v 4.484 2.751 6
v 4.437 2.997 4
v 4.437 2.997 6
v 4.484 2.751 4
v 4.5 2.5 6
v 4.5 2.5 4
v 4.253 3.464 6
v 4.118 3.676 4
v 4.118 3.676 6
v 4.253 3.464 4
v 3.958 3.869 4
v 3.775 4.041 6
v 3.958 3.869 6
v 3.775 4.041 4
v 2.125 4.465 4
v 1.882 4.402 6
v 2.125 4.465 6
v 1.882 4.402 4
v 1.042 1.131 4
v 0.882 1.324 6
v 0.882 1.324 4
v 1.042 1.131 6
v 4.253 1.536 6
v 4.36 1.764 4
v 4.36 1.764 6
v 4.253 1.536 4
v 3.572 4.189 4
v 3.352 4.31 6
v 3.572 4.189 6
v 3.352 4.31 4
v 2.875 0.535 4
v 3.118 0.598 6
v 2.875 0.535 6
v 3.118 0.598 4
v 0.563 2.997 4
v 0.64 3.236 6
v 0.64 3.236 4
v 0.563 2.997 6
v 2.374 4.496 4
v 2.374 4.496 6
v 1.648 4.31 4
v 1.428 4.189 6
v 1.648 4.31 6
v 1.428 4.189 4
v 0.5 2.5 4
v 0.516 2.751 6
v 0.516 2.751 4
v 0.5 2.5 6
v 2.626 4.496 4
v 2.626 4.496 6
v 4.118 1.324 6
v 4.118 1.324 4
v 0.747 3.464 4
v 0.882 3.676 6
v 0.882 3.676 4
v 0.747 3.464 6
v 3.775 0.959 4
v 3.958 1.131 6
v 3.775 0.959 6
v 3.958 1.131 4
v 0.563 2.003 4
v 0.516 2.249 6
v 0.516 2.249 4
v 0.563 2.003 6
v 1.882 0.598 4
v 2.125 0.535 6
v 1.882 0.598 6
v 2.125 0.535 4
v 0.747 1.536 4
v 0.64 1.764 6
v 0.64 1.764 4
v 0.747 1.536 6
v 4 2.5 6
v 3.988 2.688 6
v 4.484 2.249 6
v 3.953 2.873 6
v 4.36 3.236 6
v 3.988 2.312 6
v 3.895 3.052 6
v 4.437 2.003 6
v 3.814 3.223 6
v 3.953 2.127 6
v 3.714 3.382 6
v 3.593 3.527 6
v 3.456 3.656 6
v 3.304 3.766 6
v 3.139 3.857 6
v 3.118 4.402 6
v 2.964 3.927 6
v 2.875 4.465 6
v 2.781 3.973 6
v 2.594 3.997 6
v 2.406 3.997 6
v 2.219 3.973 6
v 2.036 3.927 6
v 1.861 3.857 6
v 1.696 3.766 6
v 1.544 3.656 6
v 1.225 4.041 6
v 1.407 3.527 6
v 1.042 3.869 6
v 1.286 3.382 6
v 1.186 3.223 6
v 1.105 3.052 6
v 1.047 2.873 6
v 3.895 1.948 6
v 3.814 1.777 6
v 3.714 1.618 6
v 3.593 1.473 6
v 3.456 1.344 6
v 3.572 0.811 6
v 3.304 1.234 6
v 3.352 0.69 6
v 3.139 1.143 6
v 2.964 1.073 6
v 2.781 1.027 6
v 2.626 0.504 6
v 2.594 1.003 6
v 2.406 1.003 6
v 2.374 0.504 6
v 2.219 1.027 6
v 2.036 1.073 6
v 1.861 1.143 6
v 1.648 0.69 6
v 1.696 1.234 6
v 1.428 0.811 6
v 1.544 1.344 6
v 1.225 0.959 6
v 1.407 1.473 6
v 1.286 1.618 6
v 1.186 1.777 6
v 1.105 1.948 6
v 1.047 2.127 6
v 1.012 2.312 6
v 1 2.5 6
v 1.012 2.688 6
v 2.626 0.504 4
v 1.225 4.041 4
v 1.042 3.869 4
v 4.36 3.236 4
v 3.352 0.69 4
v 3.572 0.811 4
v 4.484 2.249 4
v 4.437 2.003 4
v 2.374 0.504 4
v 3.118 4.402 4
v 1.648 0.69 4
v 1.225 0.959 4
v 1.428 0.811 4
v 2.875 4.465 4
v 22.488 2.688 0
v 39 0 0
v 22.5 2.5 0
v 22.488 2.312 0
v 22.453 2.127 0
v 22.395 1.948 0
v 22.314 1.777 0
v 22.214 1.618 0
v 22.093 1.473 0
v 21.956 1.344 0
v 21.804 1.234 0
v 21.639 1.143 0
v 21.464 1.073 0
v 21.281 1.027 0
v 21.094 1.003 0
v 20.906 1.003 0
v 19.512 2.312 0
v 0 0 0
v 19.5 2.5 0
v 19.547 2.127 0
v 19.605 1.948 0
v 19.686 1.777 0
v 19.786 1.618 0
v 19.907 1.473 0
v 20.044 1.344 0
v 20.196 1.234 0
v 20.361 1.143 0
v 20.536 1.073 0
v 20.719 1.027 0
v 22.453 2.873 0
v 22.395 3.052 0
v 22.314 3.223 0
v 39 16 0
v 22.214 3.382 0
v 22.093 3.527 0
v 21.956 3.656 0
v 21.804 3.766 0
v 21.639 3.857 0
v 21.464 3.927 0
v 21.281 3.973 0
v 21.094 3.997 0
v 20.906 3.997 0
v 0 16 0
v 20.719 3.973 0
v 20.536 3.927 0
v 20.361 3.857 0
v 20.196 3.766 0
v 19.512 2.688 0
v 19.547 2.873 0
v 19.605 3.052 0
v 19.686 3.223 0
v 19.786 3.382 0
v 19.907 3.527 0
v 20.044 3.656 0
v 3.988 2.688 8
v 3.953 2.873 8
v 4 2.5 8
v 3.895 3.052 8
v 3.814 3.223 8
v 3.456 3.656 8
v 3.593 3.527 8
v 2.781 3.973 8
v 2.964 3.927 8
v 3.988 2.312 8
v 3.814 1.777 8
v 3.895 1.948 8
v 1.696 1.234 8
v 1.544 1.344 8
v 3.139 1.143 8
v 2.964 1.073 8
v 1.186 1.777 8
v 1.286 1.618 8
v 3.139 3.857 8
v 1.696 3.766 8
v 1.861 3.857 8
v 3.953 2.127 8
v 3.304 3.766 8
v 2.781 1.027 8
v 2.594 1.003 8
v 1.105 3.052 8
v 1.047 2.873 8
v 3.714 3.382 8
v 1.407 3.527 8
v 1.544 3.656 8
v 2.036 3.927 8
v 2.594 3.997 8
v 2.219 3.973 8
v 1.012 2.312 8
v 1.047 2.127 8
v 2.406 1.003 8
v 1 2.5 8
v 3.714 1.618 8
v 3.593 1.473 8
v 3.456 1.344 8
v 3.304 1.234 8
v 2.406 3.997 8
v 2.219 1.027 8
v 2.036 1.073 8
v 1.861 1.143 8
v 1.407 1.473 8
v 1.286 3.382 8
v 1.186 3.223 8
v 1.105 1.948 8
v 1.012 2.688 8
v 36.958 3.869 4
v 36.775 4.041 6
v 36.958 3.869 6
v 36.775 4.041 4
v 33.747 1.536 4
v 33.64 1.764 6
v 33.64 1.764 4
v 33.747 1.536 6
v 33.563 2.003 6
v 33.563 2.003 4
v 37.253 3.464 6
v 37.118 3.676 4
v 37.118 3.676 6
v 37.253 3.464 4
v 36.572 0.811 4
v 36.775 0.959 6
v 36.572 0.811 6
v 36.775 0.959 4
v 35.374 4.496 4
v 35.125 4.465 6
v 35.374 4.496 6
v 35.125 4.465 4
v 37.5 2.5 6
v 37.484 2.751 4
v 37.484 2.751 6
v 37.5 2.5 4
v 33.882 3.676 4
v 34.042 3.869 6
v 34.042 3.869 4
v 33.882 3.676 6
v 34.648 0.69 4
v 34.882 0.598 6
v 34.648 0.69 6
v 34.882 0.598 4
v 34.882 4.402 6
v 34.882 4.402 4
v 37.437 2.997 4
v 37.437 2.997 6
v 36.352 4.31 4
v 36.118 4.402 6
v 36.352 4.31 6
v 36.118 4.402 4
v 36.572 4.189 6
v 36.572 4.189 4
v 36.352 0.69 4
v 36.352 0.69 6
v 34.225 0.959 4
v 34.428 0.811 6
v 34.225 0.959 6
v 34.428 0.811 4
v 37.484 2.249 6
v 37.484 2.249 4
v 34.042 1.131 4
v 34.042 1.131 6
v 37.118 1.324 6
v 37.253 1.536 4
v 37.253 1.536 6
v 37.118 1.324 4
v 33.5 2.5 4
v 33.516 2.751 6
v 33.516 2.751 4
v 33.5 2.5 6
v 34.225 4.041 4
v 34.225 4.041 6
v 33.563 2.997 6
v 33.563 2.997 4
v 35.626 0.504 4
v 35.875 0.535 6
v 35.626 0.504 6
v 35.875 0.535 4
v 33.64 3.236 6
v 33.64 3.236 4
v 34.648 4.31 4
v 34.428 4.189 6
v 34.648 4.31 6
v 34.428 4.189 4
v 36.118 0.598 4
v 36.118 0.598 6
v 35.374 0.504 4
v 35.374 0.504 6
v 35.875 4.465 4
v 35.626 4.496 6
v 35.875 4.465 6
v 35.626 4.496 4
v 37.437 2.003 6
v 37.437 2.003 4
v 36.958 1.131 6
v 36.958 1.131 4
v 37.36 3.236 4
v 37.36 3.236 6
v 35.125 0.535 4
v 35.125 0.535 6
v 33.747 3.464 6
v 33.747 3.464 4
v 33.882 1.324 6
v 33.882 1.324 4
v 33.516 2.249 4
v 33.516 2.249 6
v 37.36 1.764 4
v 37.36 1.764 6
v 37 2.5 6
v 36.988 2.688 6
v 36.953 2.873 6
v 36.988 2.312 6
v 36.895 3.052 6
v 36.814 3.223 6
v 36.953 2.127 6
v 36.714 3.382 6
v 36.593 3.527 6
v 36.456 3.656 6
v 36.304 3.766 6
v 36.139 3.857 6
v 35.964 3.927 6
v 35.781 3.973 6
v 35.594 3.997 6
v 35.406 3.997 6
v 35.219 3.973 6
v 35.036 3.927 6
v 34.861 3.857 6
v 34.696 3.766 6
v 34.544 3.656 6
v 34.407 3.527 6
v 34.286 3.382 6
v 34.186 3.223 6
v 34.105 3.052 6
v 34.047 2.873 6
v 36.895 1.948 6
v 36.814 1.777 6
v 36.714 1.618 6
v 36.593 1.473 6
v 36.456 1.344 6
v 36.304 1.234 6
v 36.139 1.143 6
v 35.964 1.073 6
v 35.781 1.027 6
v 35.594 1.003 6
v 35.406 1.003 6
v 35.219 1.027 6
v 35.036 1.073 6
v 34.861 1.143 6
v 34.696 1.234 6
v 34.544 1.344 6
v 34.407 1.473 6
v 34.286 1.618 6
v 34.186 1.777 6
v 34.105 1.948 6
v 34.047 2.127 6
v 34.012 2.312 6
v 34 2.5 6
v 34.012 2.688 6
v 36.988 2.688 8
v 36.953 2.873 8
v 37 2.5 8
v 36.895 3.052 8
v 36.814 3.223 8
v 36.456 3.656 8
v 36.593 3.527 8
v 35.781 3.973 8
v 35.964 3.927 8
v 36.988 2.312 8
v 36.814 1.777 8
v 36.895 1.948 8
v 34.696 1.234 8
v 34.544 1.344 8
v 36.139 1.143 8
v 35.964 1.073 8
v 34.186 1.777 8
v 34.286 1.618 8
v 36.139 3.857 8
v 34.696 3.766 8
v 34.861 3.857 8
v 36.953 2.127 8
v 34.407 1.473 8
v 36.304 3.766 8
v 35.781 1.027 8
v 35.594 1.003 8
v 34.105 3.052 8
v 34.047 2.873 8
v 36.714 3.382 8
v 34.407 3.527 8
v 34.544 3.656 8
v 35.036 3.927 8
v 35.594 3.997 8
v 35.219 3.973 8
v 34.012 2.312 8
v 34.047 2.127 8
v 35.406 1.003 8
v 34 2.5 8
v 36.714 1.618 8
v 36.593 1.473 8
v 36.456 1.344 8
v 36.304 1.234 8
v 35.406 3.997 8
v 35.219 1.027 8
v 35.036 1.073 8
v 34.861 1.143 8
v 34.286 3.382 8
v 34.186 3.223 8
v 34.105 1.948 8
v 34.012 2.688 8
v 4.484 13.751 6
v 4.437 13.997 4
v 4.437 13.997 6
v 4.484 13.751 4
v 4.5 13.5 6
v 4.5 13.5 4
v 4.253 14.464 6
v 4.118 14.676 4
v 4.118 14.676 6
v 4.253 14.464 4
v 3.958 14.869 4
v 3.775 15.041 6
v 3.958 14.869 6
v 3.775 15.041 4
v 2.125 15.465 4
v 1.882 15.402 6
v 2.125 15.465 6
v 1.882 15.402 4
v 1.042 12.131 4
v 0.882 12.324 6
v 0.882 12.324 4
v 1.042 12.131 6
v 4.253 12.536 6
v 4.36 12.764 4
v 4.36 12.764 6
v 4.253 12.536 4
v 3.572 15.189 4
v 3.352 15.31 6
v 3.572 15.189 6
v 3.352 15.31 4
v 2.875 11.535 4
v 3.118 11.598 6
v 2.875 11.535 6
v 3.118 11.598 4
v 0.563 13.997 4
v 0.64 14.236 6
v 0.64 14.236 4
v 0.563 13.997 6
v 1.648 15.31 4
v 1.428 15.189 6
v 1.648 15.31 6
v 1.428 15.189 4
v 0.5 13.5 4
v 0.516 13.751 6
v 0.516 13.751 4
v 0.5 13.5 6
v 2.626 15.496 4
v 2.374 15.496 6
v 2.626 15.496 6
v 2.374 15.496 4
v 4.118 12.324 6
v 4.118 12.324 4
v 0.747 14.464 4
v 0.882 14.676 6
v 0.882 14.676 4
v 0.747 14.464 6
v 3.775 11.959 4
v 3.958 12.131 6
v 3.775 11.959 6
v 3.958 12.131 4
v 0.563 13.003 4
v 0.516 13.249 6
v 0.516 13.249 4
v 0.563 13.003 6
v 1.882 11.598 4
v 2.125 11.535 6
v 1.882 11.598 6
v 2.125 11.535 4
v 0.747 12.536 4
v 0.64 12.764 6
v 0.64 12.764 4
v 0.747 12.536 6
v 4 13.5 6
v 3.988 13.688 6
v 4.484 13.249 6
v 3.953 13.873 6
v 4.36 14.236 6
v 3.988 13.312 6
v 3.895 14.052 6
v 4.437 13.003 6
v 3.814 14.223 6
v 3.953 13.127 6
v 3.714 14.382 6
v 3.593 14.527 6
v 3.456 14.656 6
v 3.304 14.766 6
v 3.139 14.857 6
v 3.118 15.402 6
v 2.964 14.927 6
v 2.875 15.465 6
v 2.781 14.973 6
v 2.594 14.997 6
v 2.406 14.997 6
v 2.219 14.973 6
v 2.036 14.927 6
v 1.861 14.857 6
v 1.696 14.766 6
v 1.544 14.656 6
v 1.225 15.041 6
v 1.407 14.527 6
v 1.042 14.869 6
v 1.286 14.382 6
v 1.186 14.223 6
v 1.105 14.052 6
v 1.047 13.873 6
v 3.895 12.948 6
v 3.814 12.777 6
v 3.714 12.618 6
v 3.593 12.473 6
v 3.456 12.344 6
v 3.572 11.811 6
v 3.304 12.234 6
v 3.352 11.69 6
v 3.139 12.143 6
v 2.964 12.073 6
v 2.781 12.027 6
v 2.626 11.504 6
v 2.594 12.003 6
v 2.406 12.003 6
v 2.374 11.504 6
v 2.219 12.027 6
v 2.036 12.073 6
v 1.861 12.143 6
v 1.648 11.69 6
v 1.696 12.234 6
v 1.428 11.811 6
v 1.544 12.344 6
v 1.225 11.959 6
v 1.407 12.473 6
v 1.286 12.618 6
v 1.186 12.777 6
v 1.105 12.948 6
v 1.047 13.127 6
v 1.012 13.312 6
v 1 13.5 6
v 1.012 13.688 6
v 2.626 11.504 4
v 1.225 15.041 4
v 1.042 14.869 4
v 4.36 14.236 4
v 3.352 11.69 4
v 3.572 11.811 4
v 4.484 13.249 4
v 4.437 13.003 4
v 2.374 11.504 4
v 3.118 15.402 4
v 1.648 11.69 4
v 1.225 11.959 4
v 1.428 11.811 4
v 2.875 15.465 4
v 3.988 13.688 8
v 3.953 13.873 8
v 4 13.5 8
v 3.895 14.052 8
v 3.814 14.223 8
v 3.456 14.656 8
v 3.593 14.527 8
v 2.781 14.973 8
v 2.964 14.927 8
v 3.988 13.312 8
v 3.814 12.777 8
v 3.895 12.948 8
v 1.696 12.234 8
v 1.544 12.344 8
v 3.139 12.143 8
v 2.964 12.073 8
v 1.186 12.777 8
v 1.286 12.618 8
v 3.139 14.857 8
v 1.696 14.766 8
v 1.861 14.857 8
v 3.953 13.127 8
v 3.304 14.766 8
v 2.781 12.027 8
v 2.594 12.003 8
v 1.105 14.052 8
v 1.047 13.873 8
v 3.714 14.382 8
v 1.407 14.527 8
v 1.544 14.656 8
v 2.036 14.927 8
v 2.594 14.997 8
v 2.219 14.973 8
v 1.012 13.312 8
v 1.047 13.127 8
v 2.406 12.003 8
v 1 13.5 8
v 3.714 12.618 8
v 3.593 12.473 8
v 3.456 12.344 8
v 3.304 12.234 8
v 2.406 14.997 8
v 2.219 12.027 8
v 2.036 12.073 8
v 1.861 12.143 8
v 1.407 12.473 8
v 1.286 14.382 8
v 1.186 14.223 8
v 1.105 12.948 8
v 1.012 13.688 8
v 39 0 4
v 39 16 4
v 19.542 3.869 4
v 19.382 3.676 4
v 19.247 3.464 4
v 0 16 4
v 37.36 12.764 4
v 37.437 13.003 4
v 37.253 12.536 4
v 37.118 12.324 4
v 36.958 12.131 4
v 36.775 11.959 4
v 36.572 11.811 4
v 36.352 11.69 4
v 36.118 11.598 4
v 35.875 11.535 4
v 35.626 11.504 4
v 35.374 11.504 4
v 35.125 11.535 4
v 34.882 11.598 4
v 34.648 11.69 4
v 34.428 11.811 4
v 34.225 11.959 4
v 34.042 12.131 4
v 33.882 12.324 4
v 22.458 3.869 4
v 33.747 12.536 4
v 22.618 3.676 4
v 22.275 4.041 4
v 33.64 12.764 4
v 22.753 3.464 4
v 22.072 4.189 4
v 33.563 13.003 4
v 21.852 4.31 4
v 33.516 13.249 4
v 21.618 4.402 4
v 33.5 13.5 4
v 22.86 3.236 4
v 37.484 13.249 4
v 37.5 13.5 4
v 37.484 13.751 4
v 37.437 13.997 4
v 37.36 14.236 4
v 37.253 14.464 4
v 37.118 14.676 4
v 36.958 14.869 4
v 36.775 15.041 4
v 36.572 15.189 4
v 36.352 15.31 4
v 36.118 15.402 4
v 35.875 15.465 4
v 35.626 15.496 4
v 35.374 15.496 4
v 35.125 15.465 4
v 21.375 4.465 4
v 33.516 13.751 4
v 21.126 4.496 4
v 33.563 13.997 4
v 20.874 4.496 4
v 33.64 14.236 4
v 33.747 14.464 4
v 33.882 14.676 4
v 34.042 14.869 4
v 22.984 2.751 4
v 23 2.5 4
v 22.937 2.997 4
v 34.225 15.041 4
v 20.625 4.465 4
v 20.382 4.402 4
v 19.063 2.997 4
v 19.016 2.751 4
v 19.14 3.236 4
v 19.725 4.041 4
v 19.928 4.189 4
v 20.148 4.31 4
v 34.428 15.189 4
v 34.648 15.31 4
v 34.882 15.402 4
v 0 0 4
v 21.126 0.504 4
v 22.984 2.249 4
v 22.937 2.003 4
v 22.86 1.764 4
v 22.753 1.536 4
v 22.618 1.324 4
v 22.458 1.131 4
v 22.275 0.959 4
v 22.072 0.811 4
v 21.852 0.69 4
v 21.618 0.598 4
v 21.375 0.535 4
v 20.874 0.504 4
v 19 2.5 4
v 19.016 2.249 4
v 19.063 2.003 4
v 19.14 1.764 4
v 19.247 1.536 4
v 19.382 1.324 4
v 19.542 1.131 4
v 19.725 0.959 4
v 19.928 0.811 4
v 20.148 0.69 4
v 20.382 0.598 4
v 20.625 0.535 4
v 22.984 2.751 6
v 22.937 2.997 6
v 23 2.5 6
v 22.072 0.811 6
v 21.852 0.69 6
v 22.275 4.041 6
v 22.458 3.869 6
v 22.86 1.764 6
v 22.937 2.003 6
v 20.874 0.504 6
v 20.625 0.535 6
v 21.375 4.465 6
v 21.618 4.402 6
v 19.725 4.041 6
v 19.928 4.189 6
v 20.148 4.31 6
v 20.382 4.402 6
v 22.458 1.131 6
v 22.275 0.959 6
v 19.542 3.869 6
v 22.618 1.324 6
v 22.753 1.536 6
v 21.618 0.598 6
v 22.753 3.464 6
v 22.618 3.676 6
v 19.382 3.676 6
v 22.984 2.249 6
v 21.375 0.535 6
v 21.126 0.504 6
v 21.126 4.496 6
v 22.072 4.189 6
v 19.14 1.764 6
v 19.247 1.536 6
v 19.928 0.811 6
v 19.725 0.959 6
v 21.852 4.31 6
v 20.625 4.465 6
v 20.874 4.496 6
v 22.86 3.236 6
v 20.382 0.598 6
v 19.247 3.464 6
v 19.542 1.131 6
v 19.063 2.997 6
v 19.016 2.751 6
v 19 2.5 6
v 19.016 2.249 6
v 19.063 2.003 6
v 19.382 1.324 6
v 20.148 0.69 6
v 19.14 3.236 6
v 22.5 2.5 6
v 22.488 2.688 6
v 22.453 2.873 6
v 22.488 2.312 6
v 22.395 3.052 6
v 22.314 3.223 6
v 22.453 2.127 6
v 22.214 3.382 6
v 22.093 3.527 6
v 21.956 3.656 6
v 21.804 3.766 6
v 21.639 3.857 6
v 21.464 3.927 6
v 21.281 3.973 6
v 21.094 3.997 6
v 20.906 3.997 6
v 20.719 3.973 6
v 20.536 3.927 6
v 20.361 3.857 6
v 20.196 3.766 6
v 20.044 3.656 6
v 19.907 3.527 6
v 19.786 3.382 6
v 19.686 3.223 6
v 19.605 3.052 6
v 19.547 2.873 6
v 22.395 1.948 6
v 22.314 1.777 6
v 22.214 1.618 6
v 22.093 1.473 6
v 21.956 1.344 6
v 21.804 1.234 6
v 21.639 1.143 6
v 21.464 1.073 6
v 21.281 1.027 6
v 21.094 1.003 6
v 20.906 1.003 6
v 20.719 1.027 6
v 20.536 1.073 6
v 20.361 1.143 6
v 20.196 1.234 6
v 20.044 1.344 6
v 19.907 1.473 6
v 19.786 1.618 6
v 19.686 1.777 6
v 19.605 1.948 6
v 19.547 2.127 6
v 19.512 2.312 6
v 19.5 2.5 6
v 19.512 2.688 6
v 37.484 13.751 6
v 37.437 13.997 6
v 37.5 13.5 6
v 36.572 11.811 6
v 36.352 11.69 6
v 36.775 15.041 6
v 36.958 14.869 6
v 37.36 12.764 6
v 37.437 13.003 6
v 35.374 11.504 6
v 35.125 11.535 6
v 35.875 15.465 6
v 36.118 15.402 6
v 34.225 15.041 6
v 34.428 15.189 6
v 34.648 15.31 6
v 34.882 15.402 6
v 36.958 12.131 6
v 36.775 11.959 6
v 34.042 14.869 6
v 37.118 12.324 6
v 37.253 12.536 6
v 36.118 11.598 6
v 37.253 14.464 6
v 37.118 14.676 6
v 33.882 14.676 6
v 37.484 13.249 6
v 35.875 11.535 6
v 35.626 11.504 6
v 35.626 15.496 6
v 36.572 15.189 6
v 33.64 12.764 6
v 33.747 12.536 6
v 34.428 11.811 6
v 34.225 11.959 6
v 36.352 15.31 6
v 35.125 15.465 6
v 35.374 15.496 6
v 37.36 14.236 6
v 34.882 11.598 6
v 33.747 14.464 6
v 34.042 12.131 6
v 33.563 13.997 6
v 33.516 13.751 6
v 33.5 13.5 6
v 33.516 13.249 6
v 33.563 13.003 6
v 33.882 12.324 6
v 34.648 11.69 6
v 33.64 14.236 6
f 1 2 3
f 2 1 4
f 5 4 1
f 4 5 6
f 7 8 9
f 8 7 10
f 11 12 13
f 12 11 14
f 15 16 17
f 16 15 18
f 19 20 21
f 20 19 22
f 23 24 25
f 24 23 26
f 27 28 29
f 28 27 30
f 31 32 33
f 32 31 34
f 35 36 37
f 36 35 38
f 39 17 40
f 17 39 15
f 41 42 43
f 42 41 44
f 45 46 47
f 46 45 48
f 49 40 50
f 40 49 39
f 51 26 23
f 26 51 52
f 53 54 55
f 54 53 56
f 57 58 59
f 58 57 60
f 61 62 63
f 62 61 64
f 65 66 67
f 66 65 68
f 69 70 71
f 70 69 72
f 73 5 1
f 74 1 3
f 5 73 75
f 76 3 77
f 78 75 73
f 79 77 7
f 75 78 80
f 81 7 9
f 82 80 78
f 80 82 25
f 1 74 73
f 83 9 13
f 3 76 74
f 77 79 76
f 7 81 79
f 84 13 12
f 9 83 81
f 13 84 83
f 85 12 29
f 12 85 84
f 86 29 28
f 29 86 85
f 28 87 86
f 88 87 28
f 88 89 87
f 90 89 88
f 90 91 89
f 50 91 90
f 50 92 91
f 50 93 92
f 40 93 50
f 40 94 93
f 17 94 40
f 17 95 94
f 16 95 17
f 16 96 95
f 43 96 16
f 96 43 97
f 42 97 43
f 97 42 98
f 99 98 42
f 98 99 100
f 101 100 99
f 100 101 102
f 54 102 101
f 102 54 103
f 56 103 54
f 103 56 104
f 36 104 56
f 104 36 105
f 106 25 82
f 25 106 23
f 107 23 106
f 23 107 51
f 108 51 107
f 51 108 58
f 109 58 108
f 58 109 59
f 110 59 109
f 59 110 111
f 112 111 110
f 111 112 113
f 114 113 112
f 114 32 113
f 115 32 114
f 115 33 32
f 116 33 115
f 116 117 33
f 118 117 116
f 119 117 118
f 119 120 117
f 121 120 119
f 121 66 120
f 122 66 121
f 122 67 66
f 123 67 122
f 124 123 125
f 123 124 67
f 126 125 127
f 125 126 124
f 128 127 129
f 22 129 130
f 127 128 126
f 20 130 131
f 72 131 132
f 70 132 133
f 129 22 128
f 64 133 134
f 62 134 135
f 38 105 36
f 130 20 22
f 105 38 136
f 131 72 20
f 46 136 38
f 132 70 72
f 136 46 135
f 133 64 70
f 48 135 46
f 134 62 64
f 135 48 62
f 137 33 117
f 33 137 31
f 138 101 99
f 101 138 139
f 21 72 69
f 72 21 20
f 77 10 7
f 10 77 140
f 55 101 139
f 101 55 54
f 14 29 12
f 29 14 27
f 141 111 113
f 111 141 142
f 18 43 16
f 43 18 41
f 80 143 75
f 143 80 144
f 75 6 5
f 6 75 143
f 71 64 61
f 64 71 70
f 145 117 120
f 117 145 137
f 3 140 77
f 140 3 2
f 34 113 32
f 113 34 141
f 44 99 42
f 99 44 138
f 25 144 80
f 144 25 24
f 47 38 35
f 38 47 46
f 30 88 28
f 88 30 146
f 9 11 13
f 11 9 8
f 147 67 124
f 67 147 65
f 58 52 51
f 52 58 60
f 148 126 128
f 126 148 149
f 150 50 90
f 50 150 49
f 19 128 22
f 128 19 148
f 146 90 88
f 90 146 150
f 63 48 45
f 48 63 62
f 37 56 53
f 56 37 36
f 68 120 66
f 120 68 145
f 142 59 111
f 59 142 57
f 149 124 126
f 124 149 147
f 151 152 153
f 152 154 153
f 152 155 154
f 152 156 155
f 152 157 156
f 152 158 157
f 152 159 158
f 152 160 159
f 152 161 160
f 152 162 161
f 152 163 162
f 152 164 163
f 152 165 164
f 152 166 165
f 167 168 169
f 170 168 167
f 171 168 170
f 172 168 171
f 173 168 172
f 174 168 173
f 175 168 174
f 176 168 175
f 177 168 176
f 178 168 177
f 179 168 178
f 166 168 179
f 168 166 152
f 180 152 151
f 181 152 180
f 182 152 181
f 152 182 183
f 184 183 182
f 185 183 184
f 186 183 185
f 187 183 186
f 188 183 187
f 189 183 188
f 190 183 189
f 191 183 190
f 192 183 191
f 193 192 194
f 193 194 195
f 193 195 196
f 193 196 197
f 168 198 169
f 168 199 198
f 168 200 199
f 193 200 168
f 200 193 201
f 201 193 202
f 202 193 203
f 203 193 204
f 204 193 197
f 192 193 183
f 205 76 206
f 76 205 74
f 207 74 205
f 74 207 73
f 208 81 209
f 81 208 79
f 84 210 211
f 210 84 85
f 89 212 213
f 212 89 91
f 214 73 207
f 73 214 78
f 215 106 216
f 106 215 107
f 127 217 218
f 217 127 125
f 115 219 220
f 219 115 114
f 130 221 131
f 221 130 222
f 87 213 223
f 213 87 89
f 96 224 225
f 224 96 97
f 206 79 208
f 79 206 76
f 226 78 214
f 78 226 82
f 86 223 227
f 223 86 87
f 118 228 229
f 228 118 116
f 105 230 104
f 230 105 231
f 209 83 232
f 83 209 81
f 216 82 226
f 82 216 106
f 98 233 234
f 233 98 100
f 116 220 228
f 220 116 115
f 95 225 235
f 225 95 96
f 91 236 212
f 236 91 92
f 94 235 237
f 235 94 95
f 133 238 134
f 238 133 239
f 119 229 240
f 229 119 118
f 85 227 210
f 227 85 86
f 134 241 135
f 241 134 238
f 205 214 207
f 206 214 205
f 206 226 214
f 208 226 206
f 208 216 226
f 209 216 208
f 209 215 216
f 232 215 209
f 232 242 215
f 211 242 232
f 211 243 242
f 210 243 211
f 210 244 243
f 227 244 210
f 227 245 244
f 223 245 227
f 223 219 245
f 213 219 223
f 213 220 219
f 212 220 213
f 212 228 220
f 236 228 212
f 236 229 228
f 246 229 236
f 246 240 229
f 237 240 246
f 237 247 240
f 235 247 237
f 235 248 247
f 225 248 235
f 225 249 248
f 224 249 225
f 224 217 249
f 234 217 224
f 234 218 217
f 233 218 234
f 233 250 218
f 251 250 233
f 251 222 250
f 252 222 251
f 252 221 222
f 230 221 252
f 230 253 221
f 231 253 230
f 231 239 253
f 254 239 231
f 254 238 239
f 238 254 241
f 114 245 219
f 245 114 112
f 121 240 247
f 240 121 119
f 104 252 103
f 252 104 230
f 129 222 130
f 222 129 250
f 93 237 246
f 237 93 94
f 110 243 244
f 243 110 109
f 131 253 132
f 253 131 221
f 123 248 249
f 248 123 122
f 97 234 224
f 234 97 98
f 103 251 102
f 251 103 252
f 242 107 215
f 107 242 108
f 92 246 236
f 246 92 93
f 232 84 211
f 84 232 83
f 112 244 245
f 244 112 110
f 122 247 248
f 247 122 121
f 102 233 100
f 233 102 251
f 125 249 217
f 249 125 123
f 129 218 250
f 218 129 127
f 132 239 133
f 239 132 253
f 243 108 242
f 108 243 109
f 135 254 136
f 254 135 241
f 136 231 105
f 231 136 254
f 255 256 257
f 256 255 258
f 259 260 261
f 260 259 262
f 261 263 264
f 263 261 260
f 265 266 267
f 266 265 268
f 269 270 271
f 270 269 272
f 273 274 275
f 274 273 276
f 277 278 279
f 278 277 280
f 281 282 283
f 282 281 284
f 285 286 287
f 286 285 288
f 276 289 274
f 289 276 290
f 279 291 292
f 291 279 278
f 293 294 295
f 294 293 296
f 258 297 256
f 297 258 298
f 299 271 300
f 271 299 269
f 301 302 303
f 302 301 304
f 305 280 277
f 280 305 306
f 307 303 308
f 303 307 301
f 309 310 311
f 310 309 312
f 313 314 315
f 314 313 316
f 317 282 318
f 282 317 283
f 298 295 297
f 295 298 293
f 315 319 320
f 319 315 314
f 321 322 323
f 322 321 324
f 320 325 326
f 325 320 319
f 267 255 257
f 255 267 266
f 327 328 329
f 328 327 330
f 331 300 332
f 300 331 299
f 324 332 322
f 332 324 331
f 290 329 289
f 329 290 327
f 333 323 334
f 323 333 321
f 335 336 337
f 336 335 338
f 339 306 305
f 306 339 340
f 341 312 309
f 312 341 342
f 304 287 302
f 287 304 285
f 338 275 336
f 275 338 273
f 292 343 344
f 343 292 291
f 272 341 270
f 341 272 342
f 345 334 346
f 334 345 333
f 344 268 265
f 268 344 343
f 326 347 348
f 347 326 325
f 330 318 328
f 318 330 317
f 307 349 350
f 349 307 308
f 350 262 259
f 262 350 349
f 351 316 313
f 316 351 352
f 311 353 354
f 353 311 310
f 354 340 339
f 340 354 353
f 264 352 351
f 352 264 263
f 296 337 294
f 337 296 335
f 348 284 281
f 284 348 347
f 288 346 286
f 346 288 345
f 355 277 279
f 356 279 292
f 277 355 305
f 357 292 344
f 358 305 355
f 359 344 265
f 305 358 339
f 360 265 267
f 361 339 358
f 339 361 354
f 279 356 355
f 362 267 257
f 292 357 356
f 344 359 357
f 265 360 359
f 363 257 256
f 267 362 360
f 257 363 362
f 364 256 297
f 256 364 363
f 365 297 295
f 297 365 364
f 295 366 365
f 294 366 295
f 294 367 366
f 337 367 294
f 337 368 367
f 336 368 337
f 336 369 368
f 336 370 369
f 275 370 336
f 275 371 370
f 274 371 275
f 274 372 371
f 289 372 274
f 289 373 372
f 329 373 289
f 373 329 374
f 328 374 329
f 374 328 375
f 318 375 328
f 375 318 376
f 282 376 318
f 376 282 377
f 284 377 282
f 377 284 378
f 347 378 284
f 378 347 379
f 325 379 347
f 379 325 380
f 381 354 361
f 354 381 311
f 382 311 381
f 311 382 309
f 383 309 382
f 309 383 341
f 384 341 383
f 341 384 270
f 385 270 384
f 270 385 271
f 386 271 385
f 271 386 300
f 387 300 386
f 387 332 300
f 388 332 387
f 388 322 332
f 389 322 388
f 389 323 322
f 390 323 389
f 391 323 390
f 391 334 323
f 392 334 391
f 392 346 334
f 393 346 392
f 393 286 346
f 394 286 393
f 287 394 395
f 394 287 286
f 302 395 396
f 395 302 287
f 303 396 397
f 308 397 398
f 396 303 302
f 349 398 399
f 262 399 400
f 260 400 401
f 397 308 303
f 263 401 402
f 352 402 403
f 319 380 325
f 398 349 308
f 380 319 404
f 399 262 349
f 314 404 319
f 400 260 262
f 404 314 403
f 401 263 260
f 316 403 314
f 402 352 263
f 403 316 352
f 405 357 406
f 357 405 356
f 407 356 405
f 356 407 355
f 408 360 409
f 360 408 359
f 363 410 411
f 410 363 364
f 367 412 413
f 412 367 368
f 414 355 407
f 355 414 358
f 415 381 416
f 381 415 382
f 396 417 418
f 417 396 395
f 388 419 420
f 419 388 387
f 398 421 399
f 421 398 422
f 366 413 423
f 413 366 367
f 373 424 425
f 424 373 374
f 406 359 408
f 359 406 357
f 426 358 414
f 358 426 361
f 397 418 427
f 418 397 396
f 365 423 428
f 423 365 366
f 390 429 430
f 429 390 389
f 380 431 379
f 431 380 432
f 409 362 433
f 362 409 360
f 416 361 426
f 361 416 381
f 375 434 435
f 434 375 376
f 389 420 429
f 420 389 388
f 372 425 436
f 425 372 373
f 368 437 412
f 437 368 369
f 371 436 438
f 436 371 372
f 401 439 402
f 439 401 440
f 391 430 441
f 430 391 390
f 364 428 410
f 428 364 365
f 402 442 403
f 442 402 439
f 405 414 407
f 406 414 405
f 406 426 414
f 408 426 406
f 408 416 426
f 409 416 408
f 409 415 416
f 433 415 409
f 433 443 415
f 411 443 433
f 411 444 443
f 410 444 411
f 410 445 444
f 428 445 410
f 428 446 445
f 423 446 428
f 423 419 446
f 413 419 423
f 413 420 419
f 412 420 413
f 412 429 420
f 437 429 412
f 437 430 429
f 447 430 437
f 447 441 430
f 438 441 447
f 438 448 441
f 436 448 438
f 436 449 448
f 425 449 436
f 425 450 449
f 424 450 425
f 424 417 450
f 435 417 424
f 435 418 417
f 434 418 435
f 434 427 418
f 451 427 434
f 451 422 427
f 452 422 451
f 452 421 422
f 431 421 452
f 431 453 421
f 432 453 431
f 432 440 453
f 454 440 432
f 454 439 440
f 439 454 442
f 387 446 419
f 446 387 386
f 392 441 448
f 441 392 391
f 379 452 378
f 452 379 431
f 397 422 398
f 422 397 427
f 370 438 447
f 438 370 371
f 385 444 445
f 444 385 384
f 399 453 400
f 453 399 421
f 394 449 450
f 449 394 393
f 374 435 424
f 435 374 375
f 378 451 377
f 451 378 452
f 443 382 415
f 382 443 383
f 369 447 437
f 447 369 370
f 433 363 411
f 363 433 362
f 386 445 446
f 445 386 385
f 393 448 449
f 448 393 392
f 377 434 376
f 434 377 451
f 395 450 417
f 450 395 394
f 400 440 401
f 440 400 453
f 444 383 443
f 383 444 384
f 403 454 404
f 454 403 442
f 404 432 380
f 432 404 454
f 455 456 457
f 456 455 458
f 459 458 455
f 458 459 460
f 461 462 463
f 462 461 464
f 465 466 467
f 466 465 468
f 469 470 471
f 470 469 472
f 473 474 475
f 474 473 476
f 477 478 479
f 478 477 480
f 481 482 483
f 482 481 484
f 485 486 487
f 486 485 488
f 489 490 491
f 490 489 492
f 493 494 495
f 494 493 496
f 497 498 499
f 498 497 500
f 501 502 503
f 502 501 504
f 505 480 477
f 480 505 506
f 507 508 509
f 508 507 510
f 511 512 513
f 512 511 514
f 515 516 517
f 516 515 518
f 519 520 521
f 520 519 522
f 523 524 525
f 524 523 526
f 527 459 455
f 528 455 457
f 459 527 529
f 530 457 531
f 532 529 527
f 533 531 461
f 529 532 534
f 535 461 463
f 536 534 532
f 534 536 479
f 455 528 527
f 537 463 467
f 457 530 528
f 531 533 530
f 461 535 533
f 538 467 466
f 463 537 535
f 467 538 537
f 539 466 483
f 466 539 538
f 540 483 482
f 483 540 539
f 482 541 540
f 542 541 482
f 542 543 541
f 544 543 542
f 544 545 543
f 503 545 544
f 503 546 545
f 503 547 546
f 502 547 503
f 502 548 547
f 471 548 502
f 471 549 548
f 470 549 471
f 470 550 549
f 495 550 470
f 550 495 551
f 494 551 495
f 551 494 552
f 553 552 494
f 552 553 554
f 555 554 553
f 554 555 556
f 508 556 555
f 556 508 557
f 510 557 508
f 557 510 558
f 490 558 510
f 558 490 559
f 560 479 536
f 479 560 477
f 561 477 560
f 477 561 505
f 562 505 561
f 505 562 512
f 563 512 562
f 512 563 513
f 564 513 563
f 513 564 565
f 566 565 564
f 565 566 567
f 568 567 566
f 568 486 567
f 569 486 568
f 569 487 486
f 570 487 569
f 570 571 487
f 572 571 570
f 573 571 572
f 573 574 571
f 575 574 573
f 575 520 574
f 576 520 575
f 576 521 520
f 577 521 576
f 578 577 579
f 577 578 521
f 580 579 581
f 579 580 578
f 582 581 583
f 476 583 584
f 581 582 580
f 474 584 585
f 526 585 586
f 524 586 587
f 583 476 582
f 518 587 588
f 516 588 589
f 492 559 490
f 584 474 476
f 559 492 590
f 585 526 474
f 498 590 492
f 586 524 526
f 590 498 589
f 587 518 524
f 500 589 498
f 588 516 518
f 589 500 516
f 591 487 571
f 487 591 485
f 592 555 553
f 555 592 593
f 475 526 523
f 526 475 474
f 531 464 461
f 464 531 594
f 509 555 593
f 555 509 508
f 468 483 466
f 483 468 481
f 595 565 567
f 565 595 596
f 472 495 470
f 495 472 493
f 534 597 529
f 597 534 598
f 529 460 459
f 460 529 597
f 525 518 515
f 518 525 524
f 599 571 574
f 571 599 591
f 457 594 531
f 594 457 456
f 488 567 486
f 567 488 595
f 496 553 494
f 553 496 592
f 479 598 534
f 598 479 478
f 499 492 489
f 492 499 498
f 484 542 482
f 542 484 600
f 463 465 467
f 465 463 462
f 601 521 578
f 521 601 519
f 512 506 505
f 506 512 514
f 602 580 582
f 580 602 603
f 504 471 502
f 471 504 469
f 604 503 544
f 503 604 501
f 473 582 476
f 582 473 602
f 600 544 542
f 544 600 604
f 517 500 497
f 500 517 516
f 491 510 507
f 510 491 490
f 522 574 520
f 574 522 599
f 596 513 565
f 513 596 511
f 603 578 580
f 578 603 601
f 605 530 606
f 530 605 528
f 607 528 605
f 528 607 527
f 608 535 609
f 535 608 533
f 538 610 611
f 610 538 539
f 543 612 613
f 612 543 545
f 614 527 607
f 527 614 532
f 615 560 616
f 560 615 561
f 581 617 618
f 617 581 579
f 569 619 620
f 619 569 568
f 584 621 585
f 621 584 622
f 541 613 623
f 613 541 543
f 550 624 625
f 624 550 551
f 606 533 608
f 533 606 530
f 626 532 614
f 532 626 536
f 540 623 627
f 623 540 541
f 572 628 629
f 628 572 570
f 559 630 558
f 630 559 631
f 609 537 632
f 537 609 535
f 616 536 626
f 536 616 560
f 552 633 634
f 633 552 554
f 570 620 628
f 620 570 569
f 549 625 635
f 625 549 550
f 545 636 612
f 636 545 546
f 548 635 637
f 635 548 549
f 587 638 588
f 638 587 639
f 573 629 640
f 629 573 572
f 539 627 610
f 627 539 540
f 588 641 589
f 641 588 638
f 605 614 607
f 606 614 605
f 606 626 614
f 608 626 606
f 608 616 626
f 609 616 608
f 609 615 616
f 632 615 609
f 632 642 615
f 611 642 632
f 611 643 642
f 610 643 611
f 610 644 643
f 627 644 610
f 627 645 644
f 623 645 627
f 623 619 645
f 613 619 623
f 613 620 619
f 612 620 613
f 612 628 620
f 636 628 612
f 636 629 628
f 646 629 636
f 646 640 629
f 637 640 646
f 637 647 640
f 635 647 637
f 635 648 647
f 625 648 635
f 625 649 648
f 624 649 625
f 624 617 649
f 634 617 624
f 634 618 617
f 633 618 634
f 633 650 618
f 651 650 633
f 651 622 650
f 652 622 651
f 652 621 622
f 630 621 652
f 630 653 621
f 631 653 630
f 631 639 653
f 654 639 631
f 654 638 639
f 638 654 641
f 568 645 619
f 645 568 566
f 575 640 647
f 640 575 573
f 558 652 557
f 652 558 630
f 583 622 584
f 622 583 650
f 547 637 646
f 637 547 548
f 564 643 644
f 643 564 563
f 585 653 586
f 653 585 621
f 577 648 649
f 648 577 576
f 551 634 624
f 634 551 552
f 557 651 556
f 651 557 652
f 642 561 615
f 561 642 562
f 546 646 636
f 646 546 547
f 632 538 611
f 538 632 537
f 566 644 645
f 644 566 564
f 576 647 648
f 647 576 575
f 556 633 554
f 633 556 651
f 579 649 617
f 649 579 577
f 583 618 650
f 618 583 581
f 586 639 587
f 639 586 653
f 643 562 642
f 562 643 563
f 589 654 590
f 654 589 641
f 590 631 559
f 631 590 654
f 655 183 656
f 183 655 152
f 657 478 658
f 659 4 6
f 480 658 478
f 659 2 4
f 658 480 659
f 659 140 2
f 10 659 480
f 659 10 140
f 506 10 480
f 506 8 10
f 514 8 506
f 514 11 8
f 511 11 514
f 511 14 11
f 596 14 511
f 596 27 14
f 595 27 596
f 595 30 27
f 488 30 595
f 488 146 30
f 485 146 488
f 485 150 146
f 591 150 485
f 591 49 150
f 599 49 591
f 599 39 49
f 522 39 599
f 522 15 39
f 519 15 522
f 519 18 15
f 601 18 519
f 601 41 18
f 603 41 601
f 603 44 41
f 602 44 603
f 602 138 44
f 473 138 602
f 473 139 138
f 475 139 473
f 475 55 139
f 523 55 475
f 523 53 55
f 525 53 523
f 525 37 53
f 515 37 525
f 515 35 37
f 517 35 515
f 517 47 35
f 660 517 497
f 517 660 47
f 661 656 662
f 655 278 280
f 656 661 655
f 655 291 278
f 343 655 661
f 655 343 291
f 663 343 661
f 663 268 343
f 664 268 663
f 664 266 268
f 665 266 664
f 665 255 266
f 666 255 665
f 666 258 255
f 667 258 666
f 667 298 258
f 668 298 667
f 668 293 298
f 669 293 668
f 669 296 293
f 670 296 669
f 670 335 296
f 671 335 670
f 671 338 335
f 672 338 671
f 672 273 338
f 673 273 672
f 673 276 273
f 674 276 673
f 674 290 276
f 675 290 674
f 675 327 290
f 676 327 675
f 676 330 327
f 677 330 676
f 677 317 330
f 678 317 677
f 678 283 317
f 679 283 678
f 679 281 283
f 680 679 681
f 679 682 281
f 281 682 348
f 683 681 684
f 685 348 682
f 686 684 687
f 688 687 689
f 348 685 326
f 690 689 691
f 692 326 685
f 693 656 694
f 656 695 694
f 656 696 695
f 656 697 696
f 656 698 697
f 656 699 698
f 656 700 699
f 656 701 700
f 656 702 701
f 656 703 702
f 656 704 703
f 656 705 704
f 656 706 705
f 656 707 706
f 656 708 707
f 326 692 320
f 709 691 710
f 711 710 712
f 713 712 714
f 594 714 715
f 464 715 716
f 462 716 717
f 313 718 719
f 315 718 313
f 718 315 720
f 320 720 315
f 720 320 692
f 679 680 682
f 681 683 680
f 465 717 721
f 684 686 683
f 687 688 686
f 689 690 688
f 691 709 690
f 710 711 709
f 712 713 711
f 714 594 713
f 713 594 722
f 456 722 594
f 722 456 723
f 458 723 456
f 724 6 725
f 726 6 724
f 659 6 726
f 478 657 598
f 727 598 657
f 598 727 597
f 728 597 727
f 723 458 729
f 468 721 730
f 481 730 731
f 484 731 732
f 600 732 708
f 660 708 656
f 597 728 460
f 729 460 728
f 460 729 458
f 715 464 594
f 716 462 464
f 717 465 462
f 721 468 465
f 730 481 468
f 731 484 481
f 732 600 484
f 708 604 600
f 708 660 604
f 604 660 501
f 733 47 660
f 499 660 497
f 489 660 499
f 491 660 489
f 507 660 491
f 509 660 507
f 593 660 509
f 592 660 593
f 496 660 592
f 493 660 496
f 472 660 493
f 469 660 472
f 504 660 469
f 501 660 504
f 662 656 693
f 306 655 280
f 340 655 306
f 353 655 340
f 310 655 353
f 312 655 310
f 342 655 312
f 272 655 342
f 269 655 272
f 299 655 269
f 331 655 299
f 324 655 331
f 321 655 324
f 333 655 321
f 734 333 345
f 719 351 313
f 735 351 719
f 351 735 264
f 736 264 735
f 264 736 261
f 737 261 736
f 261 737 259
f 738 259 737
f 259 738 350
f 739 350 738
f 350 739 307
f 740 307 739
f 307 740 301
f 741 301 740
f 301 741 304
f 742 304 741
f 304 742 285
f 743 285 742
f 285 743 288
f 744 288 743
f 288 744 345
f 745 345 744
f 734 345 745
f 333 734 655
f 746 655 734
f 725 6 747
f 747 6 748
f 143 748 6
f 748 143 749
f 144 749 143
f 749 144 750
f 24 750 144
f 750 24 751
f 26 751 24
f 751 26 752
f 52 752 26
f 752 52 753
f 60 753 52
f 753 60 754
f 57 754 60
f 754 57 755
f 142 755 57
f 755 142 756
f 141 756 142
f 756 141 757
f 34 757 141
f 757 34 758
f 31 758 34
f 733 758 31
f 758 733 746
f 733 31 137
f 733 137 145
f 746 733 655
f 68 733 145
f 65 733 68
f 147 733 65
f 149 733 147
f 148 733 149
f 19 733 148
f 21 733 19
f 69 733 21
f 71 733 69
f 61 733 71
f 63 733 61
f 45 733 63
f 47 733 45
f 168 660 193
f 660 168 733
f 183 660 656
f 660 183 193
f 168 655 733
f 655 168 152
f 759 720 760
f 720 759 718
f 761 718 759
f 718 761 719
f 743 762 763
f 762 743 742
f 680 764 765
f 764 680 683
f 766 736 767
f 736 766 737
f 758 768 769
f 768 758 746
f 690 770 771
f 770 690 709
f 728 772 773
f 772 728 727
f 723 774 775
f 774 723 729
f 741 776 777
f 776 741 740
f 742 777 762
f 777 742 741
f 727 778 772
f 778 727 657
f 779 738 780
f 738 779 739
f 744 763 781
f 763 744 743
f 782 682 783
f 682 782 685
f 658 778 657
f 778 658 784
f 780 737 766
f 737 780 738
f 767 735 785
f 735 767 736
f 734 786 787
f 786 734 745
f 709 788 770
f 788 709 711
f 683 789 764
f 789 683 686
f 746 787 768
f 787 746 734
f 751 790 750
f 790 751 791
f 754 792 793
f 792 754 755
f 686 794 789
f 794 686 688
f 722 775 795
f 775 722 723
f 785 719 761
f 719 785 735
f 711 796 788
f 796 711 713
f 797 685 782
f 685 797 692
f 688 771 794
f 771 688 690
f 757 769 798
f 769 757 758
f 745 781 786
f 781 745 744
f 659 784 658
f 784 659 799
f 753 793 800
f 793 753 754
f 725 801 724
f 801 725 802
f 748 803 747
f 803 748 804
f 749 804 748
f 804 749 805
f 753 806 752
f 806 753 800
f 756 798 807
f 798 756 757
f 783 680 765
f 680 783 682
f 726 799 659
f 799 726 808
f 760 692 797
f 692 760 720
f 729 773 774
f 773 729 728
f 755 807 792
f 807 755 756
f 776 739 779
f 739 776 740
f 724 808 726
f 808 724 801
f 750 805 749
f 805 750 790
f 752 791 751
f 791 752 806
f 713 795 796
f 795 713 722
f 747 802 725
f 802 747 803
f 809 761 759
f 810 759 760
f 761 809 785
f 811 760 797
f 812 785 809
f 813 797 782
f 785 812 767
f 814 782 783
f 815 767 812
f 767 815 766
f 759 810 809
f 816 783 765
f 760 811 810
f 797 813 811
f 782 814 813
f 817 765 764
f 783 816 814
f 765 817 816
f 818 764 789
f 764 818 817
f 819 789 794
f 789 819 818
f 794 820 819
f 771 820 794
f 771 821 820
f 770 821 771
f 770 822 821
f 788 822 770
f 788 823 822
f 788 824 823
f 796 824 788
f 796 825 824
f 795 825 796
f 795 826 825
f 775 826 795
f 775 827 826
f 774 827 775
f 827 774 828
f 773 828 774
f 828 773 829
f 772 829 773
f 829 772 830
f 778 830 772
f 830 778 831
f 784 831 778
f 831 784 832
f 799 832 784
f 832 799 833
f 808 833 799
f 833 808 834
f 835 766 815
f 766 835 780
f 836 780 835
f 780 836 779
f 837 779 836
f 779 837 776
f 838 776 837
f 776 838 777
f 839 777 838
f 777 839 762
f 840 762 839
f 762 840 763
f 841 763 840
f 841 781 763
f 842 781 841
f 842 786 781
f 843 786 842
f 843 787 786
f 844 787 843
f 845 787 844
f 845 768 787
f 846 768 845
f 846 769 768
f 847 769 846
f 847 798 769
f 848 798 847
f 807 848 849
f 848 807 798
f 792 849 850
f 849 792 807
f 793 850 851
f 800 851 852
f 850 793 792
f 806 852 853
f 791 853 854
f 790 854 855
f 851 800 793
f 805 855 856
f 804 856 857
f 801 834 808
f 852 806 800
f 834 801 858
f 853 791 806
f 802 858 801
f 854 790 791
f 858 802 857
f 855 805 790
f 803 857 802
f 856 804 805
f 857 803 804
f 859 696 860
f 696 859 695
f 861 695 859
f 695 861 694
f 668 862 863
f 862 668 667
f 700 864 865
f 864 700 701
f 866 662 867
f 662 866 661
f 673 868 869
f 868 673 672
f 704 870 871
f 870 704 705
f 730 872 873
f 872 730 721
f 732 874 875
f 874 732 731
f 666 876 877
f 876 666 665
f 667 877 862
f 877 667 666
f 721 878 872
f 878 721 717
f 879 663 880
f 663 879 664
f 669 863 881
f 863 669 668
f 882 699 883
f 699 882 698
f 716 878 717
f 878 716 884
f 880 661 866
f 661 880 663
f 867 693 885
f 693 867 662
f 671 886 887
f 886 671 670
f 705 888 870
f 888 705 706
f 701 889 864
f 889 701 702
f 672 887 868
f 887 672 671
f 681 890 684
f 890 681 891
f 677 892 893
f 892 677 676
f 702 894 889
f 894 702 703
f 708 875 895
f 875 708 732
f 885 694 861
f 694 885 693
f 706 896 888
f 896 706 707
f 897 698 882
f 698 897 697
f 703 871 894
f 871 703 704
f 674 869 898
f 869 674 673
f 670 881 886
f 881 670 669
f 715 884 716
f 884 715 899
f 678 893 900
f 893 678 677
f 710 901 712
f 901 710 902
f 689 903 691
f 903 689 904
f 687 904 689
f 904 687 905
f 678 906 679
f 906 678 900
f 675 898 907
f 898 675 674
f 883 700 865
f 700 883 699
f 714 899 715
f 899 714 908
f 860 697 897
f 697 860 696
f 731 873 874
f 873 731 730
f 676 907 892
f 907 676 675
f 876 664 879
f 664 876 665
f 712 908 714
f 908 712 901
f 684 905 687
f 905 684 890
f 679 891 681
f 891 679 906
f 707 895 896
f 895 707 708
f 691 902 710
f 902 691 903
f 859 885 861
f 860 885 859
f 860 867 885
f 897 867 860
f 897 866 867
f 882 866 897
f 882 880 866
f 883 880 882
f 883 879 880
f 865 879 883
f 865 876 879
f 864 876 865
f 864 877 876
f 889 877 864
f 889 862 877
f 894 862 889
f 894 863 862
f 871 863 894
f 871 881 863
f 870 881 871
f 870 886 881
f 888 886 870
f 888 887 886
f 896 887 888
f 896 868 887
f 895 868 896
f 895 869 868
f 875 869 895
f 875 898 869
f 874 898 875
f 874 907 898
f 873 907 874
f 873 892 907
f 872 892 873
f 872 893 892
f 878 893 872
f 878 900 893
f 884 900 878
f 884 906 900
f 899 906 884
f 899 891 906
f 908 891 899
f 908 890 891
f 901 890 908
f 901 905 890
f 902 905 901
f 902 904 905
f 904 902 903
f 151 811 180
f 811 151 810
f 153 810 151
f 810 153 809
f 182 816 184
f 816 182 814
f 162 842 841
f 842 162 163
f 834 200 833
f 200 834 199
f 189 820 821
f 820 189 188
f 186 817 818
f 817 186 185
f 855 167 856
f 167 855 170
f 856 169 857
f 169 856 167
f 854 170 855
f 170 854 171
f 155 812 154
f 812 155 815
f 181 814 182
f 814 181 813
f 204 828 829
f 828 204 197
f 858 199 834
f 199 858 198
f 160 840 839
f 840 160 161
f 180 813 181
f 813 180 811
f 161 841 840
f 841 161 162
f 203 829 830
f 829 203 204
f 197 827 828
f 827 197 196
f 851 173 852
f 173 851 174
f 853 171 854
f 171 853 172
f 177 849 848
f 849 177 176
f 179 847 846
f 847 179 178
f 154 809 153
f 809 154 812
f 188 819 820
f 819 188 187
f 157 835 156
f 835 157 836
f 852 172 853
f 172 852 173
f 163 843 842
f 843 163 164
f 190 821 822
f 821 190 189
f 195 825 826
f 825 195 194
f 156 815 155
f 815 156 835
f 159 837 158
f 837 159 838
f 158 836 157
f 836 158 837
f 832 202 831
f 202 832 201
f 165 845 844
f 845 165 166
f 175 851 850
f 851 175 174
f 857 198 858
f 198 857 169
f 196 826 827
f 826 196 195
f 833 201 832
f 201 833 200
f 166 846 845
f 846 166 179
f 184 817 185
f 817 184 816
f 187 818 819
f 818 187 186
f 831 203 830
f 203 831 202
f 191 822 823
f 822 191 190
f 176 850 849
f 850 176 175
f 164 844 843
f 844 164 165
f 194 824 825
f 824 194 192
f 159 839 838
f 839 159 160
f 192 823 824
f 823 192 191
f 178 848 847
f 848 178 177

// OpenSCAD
// file: configuration.scad
// Increase this if your slicer or printer make holes too tight.
extra_radius = 0; // 0.1;

// OD = outside diameter, corner to corner.
m3_nut_od = 6.1;
m3_nut_radius = m3_nut_od/2 + 0.2 + extra_radius;
m3_nut_h = 2.4;
m3_nyloc_h = 3.9;
m3_washer_radius = 3.5 + extra_radius;

m4_nut_od = 7.8;
m4_nut_radius = m4_nut_od/2 + 0.2 + extra_radius;
m4_washer_radius = 4.4 + extra_radius;

// Major diameter of metric 3mm thread.
m3_major = 2.85;
m3_radius = m3_major/2 + extra_radius;
m3_wide_radius = m3_major/2 + extra_radius + 0.2;

// Major diameter of metric 4mm thread.
m4_major = 4.85;
m4_radius = m4_major/2 + extra_radius;
m4_wide_radius = m4_major/2 + extra_radius + 0.2;

// M6 Radius
m6_radius = 6/2;

// NEMA17 stepper motors.
motor_shaft_diameter = 5;
motor_shaft_radius = motor_shaft_diameter/2 + extra_radius;

// Frame brackets. M3x8mm screws work best with 3.6 mm brackets.
thickness = 4.0; //3.6 on 1515

// OpenBeam or Misumi. Currently only 15x15 mm, but there is a plan
// to make models more parametric and allow 20x20 mm in the future.
extrusion = 20;

// Placement for the NEMA17 stepper motors.
motor_offset = 44;
motor_length = 47;

separation = 38;  // Distance between ball joint mounting faces.

extrusion_fin_d = 1;

vertex_radius = 40.5; //set to 36 for 1515
vertex_x_offset = 7.25; // offset of the horizontal extrusion to the vertical one in X axis
vertex_y_offset = 39 ;//27; // offset of the horizontal extrusion to the vertical one in Y axis
// main file
include <configuration.scad>;

difference()
{
    union()
    {
        cube([39,16,4]);
        translate([2.5,2.5,0])
        {
            cylinder(r=2, h=6, $fn=50);
            cylinder(r=1.5, h=8, $fn=50);
        }
        translate([33+2.5,2.5,0])
        {
            cylinder(r=2, h=6, $fn=50);
            cylinder(r=1.5, h=8, $fn=50);
        }
        translate([2.5,16-2.5,0])
        {
            cylinder(r=2, h=6, $fn=50);
            cylinder(r=1.5, h=8, $fn=50);
        }
        translate([2.5+18.5,2.5,0])
        {
            cylinder(r=2, h=6, $fn=50);
        }
        translate([33+2.5,16-2.5,0])
        {
            cylinder(r=2, h=6, $fn=50);
        }
    }
    translate([2.5+18.5,2.5,0])
    {
        cylinder(r=1.5,h=10,$fn=50);
    }
}
//use <microswitch.scad>;

//thickness = 9;  // 1mm thicker than linear rail.
//width = 15;  // Same as vertical extrusion.
//height = 15;

/*module endstop() {
  difference() {
    union() {
      cube([width, thickness, height], center=true);
      translate([0, 0, -height/4])
        cube([width+2, thickness, height/2], center=true);
      translate([0, 2, 0])
        cube([2.5, thickness, height], center=true);
    }
    translate([0, 0, 3]) rotate([90, 0, 0]) {
      cylinder(r=m3_wide_radius, h=20, center=true, $fn=12);
      translate([0, 0, 3.6-thickness/2]) {
        cylinder(r=3, h=10, $fn=24);
        translate([0, 5, 5])
          cube([6, 10, 10], center=true);
      }
      translate([0, 0, -thickness/2]) scale([1, 1, -1])
        cylinder(r1=m3_wide_radius, r2=7, h=4, $fn=24);
    }
    translate([0, -3-thickness/2, -2]) rotate([0, 180, 0]) {
      % microswitch();
      for (x = [-9.5/2, 9.5/2]) {
        translate([x, 0, 0]) rotate([90, 0, 0])
          cylinder(r=2.5/2, h=40, center=true, $fn=12);
      }
    }
  }
}

translate([0, 0, height/2]) endstop();*/
